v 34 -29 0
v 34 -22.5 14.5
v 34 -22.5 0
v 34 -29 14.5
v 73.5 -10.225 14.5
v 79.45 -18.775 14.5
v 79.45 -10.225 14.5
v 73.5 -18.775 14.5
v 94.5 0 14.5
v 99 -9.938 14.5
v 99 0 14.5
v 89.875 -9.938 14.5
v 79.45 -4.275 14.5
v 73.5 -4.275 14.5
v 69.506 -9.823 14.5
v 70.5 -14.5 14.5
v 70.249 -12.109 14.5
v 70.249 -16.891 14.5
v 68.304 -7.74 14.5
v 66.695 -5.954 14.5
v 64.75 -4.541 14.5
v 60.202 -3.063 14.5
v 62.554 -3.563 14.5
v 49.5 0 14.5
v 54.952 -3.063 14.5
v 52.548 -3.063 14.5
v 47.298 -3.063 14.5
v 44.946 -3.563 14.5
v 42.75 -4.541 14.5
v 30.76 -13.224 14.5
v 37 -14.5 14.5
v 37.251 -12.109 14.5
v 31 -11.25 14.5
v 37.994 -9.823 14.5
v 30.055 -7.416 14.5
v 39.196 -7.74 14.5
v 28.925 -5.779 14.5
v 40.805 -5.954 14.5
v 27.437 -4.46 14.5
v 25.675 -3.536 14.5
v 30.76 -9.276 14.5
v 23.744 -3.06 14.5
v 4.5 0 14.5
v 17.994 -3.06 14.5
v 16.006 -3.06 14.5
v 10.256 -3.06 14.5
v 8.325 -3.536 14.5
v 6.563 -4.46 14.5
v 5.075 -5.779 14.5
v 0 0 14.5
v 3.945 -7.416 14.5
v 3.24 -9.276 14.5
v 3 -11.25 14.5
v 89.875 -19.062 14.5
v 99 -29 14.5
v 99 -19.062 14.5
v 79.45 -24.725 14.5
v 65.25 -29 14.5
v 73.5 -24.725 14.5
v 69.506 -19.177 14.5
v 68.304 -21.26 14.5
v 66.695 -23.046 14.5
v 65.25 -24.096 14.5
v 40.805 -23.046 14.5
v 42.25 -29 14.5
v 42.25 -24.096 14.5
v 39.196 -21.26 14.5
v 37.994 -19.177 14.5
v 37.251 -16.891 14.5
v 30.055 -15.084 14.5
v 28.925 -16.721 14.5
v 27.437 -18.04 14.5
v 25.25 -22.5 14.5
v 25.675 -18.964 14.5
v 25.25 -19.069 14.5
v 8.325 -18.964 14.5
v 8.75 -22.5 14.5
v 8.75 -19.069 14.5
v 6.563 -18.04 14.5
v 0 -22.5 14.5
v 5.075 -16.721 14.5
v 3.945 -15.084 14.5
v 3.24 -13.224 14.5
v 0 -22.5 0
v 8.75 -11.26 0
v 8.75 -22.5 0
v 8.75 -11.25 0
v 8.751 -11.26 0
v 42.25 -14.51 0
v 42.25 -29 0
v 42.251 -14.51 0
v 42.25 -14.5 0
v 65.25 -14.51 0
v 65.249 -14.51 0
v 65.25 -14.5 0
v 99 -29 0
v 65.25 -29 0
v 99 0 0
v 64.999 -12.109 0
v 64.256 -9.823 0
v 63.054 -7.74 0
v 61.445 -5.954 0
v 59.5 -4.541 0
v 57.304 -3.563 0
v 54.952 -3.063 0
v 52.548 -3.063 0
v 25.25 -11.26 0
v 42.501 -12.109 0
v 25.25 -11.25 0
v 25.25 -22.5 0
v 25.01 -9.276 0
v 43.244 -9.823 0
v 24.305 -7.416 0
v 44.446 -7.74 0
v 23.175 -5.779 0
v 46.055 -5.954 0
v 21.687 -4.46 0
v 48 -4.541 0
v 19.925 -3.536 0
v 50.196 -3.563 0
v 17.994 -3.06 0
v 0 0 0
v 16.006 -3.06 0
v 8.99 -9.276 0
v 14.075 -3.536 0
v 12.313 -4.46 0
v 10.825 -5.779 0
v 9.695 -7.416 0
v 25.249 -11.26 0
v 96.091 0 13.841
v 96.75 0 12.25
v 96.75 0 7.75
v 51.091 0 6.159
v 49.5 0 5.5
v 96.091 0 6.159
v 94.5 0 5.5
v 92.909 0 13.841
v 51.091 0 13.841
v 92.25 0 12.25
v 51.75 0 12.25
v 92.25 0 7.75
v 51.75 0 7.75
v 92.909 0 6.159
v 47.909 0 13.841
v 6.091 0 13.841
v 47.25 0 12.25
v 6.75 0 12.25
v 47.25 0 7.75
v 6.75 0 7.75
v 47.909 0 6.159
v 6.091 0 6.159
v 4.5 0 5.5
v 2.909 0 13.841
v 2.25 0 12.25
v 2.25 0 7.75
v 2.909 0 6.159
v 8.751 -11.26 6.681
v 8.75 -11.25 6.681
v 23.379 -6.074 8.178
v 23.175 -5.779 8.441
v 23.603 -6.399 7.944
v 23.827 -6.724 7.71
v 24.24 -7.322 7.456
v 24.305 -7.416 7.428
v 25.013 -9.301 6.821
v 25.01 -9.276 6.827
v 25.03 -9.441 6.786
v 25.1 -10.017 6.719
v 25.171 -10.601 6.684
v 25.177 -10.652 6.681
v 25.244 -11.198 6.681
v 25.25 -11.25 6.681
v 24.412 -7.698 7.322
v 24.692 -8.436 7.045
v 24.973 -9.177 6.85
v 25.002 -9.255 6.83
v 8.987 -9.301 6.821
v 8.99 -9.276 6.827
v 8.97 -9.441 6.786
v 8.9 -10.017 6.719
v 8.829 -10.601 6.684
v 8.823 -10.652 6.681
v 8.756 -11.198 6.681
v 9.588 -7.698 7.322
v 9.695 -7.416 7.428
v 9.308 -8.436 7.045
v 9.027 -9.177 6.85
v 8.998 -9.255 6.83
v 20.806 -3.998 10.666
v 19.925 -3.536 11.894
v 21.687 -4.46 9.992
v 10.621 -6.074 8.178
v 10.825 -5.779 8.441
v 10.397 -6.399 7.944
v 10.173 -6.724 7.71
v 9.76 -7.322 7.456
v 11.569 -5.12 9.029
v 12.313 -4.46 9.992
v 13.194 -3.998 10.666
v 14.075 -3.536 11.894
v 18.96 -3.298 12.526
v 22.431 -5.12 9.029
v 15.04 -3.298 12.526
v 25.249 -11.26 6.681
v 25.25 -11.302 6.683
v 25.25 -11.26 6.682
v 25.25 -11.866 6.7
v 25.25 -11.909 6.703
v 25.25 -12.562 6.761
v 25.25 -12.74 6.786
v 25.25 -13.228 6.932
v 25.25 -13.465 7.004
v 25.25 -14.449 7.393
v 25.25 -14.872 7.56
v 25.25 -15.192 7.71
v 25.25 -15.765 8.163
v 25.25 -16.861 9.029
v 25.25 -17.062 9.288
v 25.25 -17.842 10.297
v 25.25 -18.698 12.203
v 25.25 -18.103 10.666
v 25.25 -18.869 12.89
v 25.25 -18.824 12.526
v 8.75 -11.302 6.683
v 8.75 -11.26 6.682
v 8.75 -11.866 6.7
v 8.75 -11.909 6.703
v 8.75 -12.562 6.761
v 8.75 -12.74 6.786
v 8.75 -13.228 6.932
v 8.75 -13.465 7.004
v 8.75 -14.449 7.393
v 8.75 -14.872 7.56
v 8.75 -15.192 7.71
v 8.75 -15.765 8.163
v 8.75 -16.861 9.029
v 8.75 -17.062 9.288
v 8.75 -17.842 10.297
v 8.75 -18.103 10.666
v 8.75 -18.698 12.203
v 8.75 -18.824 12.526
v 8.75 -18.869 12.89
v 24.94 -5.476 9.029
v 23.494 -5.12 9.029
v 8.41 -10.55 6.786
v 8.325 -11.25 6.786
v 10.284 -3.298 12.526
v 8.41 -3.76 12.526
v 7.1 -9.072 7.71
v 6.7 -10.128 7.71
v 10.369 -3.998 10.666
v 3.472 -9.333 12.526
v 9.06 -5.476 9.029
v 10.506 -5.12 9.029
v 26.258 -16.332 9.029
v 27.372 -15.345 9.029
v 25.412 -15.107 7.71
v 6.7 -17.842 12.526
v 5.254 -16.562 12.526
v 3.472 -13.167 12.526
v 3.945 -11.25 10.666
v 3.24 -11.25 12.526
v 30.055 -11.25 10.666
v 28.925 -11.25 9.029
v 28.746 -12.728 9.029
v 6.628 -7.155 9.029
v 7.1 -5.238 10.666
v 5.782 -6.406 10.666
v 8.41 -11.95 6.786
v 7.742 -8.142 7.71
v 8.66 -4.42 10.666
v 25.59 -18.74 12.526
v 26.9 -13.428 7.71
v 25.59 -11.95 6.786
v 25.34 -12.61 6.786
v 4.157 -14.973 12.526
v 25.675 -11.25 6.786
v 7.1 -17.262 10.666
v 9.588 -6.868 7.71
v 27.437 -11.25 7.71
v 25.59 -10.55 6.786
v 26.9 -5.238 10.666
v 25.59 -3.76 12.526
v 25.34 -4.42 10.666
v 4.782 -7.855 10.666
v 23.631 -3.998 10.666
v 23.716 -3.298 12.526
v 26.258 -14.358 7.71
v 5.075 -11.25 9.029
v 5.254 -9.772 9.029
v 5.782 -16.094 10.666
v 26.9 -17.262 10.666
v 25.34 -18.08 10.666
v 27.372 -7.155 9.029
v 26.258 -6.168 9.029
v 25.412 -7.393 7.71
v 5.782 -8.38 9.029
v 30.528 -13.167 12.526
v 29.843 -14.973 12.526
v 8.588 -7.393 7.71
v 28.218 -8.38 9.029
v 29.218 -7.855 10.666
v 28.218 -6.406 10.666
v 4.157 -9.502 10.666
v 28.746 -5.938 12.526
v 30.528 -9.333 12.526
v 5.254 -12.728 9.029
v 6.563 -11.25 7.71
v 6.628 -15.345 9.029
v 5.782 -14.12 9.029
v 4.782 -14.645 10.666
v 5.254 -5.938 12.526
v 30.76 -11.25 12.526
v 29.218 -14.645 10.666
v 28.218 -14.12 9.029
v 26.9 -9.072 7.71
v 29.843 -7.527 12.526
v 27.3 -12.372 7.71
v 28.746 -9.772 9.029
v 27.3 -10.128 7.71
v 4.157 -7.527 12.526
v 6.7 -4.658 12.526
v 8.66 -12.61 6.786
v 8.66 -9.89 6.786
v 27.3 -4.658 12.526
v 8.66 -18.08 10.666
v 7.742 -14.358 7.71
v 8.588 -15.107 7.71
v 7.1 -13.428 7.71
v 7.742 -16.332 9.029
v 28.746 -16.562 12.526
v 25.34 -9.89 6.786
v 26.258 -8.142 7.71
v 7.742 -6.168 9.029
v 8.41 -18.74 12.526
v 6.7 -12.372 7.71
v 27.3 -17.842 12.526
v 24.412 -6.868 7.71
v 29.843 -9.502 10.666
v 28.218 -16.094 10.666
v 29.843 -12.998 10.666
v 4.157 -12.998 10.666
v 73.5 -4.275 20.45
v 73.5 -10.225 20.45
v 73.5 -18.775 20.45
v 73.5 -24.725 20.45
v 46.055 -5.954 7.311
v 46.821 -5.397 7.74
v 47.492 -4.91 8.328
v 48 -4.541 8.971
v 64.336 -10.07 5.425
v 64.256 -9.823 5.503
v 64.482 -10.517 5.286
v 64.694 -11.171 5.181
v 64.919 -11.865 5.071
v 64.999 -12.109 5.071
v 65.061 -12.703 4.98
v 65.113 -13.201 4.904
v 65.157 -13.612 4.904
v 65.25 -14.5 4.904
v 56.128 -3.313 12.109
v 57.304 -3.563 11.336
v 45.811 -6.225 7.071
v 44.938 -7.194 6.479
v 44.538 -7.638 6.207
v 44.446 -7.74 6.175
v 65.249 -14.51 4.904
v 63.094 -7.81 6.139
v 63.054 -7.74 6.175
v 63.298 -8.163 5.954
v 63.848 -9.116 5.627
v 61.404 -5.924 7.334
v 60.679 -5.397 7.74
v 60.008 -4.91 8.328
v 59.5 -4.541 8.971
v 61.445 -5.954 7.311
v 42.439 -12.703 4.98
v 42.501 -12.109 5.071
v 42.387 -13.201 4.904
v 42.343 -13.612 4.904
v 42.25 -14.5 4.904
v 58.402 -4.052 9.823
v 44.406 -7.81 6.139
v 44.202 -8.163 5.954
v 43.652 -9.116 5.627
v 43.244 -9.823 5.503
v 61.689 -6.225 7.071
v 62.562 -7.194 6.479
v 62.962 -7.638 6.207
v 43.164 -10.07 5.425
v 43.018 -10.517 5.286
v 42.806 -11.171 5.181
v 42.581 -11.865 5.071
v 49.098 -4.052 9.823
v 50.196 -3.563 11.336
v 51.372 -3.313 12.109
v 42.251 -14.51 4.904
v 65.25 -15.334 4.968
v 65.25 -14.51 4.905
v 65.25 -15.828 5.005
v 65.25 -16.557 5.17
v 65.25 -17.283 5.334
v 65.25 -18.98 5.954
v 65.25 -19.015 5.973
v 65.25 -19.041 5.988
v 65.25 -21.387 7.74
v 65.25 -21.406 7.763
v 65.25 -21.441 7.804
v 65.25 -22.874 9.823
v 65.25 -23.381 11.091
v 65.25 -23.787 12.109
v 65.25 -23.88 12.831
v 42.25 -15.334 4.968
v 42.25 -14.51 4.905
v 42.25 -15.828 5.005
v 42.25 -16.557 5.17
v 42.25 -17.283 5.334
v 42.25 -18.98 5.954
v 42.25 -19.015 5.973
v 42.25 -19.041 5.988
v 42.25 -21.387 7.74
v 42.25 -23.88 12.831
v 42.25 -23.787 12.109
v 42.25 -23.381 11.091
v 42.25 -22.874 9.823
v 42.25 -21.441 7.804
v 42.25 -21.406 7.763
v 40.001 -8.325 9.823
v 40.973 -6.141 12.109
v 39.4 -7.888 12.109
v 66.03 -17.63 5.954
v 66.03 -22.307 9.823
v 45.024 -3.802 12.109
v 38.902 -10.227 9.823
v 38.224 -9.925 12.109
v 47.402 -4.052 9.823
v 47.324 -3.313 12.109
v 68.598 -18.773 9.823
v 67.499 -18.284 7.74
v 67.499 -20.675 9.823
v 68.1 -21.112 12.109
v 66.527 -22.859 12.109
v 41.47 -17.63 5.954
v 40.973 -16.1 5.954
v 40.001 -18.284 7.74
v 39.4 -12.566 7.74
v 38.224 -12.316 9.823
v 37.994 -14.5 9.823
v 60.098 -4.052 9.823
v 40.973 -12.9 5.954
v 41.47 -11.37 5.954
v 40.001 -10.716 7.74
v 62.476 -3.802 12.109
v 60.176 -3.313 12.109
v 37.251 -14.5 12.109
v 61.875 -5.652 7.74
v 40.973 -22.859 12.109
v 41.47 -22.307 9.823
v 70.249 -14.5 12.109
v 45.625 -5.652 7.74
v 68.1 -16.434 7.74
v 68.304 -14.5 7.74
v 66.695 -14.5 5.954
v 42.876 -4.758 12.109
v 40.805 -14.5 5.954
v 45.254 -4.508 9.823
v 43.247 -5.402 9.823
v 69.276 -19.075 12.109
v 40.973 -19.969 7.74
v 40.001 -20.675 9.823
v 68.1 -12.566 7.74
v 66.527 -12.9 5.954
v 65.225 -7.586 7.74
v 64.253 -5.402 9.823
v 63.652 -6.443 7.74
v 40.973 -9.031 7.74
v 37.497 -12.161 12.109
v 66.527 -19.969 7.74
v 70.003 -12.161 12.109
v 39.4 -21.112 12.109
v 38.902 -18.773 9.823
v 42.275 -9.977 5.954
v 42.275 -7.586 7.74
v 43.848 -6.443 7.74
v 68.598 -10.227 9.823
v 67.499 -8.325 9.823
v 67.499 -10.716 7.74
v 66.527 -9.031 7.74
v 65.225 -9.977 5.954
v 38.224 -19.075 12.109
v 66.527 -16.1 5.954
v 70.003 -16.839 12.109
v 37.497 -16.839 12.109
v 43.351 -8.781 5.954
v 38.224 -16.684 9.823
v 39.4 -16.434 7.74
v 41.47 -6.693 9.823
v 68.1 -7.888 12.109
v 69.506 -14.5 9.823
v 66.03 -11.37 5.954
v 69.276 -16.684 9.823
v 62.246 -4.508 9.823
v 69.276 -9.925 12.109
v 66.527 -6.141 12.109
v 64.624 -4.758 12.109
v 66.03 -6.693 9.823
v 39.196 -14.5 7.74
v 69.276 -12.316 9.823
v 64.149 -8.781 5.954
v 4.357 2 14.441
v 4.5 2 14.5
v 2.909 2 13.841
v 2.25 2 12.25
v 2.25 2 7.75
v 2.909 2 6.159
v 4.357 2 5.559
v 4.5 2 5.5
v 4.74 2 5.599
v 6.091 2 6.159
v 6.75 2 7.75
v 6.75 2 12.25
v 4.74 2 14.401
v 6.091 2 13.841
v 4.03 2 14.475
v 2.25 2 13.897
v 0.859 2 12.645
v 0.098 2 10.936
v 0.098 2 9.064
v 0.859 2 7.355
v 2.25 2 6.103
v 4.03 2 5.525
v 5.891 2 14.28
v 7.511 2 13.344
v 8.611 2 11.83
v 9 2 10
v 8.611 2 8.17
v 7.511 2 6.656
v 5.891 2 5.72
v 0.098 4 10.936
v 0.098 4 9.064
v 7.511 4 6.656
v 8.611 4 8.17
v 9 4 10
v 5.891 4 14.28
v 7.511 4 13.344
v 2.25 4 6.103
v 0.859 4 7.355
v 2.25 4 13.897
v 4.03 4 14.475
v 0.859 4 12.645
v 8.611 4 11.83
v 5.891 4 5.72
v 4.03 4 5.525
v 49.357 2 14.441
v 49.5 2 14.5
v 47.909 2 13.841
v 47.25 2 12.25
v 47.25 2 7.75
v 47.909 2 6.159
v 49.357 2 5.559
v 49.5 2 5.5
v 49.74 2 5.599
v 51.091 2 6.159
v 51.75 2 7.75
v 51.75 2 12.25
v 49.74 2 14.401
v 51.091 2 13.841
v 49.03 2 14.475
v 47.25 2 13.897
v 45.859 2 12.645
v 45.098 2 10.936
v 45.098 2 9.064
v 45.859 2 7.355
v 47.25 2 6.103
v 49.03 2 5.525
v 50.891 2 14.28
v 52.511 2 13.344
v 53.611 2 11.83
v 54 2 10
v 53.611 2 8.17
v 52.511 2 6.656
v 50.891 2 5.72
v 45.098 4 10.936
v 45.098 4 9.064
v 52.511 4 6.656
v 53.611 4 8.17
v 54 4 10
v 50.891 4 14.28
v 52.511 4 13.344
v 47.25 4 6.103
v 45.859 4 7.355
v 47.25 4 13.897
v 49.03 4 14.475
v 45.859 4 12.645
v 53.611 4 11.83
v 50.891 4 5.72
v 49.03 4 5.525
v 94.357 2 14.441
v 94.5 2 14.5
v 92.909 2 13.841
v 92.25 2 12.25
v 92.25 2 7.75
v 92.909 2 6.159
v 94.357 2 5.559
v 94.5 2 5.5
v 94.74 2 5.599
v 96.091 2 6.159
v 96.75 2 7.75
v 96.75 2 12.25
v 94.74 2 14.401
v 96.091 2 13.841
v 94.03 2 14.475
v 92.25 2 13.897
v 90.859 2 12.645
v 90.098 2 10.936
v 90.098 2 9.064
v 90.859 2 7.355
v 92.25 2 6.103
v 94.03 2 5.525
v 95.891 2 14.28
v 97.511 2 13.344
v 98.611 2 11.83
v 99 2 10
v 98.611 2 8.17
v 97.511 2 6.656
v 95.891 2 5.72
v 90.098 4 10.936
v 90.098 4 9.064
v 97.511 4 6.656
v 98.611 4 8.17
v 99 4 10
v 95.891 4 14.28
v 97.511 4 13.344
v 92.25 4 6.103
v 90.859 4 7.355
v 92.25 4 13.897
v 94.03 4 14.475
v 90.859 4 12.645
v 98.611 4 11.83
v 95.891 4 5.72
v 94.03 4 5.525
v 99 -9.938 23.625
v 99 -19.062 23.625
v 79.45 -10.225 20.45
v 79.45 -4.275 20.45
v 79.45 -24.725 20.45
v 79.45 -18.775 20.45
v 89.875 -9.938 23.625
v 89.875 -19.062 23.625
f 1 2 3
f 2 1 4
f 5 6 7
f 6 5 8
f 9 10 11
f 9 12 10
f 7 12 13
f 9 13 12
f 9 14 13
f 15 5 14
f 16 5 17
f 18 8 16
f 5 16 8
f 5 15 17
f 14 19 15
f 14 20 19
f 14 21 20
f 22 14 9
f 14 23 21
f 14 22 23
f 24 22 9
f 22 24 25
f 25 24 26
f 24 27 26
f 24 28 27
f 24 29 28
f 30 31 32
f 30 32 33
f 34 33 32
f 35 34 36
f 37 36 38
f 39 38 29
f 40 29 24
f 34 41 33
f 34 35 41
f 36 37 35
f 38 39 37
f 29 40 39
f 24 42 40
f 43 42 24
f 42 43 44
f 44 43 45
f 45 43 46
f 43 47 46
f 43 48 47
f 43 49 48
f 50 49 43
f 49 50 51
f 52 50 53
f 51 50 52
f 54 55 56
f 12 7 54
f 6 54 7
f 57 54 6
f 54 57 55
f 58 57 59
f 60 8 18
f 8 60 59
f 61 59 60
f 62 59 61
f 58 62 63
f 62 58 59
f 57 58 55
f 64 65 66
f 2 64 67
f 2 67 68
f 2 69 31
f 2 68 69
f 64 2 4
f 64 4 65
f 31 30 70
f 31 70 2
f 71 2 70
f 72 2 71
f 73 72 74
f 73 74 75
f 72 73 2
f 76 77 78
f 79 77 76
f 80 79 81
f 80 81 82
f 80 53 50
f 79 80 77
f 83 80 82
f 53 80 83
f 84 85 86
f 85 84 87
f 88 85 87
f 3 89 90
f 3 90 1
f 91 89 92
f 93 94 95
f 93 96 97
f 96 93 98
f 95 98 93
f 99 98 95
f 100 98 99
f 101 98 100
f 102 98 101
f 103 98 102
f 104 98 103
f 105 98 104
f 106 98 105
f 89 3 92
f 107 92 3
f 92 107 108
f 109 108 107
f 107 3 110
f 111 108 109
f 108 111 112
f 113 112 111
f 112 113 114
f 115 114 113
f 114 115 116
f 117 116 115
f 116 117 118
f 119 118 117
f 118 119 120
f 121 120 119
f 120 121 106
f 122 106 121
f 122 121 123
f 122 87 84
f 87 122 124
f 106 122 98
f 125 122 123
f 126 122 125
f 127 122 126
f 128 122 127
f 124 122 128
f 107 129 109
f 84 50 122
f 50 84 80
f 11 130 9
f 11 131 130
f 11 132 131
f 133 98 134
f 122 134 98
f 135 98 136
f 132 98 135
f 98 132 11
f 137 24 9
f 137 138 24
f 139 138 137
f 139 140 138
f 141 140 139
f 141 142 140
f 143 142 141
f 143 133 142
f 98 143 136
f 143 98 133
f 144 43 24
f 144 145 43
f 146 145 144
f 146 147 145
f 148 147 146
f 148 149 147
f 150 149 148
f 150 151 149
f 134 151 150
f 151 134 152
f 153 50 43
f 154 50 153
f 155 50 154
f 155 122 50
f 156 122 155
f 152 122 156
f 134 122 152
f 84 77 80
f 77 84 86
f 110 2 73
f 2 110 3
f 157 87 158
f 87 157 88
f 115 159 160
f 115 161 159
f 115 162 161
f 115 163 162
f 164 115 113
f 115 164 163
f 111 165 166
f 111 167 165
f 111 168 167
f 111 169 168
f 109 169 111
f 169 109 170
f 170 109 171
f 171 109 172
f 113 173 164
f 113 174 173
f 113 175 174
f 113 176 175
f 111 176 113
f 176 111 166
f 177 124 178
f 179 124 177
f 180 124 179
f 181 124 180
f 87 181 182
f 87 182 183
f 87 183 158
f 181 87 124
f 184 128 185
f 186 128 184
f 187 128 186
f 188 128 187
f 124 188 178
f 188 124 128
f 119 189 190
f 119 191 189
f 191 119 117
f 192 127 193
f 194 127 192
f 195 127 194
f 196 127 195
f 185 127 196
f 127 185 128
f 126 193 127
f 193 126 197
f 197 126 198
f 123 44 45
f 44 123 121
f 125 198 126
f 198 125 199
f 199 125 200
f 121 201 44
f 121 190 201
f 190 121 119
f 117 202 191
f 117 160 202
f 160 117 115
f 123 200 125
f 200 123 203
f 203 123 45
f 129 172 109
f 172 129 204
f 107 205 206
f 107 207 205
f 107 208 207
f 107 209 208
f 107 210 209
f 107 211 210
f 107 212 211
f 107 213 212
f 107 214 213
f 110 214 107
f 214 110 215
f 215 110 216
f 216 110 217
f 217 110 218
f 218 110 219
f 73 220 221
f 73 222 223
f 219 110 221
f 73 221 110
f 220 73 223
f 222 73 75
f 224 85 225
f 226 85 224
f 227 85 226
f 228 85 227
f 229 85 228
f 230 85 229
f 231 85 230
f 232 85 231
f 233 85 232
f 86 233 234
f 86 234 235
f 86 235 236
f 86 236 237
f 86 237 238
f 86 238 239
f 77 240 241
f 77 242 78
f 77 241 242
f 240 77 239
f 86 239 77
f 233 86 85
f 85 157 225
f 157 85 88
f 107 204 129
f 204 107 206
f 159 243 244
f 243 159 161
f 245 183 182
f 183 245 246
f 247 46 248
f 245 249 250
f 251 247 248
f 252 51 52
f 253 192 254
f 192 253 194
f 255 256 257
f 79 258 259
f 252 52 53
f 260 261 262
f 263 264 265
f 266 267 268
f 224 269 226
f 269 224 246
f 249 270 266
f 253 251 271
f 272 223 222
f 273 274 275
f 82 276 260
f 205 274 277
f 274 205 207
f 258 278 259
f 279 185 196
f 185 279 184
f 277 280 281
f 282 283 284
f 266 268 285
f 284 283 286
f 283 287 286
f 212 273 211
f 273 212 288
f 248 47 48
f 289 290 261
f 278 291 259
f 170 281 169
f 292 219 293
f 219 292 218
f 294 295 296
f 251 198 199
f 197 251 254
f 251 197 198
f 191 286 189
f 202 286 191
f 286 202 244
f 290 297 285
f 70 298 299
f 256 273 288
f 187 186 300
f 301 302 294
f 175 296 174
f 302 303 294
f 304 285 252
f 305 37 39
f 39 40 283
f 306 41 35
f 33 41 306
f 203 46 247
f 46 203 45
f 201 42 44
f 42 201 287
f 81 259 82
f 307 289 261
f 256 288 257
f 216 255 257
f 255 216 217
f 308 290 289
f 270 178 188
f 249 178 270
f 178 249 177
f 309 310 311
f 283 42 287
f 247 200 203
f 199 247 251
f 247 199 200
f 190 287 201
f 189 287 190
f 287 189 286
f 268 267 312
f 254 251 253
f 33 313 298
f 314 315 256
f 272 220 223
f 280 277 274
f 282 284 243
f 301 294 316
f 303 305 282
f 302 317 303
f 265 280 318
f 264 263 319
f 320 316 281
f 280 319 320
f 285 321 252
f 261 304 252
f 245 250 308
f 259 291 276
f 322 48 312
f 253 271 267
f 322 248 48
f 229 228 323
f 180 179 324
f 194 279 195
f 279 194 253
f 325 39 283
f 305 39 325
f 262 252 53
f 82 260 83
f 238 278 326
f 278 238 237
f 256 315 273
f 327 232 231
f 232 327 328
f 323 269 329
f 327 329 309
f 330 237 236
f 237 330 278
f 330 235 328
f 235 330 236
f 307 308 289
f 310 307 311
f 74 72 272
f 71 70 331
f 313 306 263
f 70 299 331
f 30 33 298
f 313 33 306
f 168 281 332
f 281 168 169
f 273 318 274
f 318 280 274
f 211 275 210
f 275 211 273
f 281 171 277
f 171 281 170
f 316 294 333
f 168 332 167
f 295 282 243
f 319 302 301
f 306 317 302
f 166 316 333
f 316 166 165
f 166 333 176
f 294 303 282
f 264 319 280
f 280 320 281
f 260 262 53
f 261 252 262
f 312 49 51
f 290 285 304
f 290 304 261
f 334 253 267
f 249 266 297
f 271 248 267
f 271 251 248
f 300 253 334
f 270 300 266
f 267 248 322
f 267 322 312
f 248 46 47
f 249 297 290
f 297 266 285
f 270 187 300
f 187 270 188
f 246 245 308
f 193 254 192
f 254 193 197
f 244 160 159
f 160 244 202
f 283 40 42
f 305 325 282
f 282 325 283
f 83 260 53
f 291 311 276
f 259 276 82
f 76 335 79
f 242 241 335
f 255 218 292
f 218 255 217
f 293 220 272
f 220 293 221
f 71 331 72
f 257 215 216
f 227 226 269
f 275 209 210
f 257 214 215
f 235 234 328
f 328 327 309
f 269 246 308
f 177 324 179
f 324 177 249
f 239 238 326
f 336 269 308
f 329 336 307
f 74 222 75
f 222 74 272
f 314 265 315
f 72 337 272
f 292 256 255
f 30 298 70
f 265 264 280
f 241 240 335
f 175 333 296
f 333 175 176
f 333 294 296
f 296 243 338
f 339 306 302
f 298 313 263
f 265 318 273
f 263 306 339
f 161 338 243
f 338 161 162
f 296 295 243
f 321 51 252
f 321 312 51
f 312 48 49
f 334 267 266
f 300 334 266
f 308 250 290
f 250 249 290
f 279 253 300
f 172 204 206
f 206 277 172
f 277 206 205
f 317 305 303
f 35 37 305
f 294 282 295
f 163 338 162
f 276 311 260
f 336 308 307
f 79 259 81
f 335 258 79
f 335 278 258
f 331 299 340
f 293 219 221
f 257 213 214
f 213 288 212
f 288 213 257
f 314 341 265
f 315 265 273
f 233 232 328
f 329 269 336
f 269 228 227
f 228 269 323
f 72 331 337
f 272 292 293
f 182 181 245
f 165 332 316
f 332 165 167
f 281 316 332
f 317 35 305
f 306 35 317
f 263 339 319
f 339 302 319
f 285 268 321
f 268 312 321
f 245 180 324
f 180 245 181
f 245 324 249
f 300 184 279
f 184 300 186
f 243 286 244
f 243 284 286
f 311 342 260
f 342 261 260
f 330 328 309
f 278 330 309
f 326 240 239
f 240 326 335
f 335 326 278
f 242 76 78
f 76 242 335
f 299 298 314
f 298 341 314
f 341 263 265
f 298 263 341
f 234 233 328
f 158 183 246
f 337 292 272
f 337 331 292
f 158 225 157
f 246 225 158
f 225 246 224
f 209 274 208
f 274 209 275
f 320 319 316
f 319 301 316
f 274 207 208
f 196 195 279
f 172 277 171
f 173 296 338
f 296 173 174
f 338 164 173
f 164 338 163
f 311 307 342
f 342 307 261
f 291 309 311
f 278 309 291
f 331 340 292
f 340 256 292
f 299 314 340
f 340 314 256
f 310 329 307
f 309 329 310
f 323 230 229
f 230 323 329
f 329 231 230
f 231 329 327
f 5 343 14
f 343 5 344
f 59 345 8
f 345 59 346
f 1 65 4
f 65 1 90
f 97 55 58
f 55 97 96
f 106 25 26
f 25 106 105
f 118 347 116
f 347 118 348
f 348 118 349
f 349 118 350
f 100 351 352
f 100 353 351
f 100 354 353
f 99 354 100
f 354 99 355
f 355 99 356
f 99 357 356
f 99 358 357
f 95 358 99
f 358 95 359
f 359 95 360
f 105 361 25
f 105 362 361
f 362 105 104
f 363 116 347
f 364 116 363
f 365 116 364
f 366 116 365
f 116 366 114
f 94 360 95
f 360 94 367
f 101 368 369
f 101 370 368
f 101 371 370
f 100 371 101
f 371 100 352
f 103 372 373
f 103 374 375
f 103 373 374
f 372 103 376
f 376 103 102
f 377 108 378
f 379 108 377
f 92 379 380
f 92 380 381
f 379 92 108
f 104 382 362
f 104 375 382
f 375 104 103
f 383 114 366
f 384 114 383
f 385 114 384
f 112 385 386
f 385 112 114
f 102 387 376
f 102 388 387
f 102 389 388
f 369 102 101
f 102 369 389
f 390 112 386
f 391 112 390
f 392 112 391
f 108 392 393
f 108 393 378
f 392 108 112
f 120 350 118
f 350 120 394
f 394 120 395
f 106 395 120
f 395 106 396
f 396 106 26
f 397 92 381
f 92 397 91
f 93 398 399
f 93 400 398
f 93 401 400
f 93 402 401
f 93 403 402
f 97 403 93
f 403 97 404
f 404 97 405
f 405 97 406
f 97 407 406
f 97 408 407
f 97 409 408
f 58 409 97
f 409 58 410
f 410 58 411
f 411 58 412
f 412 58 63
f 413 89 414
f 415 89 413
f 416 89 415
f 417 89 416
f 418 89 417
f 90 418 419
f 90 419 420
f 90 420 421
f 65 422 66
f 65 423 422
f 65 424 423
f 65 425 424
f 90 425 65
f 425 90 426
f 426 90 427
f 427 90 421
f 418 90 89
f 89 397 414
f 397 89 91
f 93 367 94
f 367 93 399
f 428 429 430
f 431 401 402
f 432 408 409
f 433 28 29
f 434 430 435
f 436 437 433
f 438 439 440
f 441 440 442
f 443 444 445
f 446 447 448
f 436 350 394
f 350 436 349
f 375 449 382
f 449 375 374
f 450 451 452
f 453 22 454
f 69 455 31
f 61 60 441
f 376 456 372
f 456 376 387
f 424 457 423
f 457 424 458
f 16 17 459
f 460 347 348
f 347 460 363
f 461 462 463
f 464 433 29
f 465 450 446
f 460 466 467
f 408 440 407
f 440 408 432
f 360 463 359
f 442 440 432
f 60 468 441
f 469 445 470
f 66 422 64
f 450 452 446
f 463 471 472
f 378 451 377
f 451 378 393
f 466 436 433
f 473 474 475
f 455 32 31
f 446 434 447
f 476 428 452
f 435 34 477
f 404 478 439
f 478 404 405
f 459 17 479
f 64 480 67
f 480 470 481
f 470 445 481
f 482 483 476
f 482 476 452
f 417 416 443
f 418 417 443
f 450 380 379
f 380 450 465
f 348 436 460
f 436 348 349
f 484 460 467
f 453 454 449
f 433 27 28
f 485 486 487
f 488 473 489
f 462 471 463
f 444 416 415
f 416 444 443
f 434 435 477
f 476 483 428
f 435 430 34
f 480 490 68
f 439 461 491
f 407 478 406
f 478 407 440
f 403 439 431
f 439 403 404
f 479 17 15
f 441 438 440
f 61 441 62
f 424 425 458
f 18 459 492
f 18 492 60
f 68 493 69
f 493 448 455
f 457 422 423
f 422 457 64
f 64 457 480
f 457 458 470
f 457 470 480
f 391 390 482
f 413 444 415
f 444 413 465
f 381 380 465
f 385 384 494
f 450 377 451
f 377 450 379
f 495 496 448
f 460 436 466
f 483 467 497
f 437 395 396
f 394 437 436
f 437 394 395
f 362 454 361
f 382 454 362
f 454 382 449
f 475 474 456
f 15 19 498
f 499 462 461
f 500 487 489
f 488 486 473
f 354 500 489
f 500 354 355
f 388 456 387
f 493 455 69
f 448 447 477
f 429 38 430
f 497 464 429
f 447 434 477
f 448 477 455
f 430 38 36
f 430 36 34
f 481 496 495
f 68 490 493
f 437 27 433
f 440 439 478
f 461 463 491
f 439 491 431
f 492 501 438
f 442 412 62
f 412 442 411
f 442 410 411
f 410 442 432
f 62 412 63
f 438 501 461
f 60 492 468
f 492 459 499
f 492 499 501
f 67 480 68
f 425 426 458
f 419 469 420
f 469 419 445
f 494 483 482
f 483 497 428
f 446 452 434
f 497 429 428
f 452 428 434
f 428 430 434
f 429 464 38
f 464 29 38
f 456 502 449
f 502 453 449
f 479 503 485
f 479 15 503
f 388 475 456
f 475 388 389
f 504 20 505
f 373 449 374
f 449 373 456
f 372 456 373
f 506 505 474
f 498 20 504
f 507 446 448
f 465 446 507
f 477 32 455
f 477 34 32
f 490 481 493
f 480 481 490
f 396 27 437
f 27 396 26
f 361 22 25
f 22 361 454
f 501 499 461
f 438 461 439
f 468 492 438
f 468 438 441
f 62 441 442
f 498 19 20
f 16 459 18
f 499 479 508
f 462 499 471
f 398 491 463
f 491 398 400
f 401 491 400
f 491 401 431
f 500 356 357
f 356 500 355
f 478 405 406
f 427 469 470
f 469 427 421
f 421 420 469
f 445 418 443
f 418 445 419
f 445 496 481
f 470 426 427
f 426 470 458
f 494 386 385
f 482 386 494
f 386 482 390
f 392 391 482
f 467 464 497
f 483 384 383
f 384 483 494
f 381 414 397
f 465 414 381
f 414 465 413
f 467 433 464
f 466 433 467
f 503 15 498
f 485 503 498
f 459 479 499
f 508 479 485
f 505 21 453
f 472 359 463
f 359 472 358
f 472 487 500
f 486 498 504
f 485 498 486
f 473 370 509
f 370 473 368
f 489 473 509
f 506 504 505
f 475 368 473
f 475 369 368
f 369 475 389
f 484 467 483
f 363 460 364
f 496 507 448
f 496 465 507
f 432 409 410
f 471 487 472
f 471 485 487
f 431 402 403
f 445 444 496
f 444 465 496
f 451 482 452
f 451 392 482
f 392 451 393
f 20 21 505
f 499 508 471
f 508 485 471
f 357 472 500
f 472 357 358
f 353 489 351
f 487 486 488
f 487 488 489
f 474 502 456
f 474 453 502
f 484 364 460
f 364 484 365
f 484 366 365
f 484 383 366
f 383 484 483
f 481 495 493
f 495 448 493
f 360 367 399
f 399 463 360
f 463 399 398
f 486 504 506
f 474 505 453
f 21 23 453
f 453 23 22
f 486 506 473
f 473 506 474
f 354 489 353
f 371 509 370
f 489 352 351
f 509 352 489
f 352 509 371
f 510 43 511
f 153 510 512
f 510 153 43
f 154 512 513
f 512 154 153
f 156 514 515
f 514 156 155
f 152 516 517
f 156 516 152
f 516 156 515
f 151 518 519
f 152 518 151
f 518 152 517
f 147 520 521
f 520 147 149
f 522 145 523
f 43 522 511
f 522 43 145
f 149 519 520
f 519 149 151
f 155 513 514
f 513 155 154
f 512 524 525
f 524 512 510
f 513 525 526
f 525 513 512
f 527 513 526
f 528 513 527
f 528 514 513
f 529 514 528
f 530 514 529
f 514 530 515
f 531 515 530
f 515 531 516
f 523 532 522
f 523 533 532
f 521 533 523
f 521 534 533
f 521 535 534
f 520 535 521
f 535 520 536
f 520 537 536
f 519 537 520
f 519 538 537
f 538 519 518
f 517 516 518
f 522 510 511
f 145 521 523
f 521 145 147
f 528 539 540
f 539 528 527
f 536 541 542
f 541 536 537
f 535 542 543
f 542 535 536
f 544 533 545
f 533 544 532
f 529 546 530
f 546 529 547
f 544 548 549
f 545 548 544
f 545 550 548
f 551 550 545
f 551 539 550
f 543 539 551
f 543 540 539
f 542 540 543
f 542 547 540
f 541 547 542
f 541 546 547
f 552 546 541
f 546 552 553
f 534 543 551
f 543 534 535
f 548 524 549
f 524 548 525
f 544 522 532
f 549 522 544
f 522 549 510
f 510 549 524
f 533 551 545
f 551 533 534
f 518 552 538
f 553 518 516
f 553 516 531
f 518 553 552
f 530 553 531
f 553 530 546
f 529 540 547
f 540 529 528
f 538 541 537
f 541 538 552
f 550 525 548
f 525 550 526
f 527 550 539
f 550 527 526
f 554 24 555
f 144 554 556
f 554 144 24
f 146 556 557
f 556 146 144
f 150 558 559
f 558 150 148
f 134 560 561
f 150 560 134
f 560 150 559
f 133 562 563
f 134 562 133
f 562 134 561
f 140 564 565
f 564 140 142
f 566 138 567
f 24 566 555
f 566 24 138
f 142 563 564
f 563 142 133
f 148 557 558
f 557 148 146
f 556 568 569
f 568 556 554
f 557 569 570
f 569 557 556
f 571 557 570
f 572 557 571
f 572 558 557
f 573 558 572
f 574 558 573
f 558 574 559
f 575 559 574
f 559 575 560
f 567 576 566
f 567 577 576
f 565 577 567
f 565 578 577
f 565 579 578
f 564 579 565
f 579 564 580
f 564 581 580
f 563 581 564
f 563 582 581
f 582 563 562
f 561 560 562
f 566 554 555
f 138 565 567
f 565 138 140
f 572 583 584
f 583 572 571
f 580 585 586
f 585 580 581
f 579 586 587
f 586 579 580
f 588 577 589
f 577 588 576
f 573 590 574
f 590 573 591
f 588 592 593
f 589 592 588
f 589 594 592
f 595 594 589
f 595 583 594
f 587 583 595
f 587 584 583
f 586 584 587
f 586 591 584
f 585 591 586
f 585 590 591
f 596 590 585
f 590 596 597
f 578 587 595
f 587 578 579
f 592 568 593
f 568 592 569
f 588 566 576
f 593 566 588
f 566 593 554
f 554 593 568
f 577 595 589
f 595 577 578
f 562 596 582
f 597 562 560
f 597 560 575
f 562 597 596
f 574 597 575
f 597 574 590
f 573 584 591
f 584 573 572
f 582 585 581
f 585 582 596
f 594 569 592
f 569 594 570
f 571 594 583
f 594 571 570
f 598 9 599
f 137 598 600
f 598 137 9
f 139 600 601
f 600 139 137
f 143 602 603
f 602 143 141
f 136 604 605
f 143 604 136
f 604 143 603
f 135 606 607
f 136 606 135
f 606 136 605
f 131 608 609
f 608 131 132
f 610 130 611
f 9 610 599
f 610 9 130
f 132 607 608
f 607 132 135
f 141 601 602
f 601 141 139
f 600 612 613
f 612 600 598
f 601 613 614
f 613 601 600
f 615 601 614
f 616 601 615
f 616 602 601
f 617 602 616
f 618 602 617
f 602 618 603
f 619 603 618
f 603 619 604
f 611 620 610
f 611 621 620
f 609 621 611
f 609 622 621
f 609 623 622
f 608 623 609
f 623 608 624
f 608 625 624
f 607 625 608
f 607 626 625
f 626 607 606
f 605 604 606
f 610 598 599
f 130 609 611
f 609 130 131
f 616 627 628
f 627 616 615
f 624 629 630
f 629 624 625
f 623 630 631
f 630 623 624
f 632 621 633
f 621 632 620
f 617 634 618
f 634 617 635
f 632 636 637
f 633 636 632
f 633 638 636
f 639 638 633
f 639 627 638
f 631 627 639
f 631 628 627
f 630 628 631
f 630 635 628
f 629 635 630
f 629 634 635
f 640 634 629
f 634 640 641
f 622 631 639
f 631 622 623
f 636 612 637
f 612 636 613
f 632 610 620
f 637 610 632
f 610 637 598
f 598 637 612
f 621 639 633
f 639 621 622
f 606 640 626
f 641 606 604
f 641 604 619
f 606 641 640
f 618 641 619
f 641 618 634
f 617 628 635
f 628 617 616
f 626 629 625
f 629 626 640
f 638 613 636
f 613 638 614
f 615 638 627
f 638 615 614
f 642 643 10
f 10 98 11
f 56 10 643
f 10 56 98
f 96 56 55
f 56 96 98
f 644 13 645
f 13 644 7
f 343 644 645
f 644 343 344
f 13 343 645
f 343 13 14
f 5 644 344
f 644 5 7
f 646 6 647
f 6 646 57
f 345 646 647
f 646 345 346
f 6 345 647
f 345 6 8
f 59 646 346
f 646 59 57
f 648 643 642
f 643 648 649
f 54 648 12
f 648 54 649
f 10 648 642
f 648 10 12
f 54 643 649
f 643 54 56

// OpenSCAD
// file: peg.scad
pegSlot = 5; // the small opening it slides into
pegD = 9;    // the large opening to put it into
pegH = 22;   // top of large opening to bottom of small opening

holeD = 3.75; // "screw" holes

holeSpacingX = 15;
holeSpacingY = 14.5; // yes, this is actually not a grid. go figure
pegSpacingX = 3 * holeSpacingX;
pegSpacingY = 4 * holeSpacingY;

module peg(t = 2, clearance = 2)
{
    D = pegD;
    d = 4.5;

    rotate([ -90, 0, 0 ])
    {
        hull()
        {
            translate([ 0, (D - d) / 2, 0 ]) cylinder(h = clearance, d = d);
            translate([ 0, -(D - d) / 2, 0 ]) cylinder(h = clearance, d = d);
        }
        translate([ 0, 0, clearance ]) cylinder(h = t, d = D);
    }
}

module pegs(n, t = 2, clearance = 2)
{
    pegSpacingX = 45;
    x0 = ((1 - n) * pegSpacingX) / 2;
    for (i = [0:(n - 1)])
    {
        translate([ x0 + i * pegSpacingX, 0, 0 ]) peg(t, clearance);
    }
}
// main file
include<peg.scad>;
d14 = 16.5;
l14 = 28;
d38 = 23;
l38 = 33.5;

t = 3;
margin = 0.4;
h = t + d38 / 2;

module cradle(d, l)
{
    difference()
    {
        w = d + 2 * t;
        L = l + 2 * t;
        translate([ 0, -w, 0 ]) cube([ L, w, h ]);
        translate([ t + l / 2, -w / 2, -.01 ]) cylinder(h = h + .02, d = d);
        translate([ t + l / 2 - d / 2, -w - .01, -.01 ]) cube([ d, w / 2, h + .02 ]);
        hull()
        {
            translate([ t + d / 2, -w / 2, h ]) sphere(d = d);
            translate([ L - t - d / 2, -w / 2, h ]) sphere(d = d);
        }
    }
}
cradle(d14, l14);
translate([l14+2*t,0,0]) cradle(d38, l38);

translate([ pegD / 2, 0, h - pegD / 2 ]) peg();
translate([ pegD / 2 + pegSpacingX, 0, h - pegD / 2 ]) peg();
translate([ pegD / 2 + 2 * pegSpacingX, 0, h - pegD / 2 ]) peg();

L = pegD + 2 * pegSpacingX;
x = l14 + l38 + 4 * t;
w38 = d38 + 2 * t;
translate([ x, -w38, 0 ]) cube([ L - x, w38, h ]);

p38 = 3 / 8 * 25.4 - margin;
p14 = 25.4 / 4 - margin;
translate([ x, -w38 / 4 - p14 / 2, h ]) cube(p14);
translate([ x, 3 * -w38 / 4 - p14 / 2, h ]) cube(p14);
translate([ L - p38, -w38 / 2 - p38 / 2, h ]) cube(p38);
